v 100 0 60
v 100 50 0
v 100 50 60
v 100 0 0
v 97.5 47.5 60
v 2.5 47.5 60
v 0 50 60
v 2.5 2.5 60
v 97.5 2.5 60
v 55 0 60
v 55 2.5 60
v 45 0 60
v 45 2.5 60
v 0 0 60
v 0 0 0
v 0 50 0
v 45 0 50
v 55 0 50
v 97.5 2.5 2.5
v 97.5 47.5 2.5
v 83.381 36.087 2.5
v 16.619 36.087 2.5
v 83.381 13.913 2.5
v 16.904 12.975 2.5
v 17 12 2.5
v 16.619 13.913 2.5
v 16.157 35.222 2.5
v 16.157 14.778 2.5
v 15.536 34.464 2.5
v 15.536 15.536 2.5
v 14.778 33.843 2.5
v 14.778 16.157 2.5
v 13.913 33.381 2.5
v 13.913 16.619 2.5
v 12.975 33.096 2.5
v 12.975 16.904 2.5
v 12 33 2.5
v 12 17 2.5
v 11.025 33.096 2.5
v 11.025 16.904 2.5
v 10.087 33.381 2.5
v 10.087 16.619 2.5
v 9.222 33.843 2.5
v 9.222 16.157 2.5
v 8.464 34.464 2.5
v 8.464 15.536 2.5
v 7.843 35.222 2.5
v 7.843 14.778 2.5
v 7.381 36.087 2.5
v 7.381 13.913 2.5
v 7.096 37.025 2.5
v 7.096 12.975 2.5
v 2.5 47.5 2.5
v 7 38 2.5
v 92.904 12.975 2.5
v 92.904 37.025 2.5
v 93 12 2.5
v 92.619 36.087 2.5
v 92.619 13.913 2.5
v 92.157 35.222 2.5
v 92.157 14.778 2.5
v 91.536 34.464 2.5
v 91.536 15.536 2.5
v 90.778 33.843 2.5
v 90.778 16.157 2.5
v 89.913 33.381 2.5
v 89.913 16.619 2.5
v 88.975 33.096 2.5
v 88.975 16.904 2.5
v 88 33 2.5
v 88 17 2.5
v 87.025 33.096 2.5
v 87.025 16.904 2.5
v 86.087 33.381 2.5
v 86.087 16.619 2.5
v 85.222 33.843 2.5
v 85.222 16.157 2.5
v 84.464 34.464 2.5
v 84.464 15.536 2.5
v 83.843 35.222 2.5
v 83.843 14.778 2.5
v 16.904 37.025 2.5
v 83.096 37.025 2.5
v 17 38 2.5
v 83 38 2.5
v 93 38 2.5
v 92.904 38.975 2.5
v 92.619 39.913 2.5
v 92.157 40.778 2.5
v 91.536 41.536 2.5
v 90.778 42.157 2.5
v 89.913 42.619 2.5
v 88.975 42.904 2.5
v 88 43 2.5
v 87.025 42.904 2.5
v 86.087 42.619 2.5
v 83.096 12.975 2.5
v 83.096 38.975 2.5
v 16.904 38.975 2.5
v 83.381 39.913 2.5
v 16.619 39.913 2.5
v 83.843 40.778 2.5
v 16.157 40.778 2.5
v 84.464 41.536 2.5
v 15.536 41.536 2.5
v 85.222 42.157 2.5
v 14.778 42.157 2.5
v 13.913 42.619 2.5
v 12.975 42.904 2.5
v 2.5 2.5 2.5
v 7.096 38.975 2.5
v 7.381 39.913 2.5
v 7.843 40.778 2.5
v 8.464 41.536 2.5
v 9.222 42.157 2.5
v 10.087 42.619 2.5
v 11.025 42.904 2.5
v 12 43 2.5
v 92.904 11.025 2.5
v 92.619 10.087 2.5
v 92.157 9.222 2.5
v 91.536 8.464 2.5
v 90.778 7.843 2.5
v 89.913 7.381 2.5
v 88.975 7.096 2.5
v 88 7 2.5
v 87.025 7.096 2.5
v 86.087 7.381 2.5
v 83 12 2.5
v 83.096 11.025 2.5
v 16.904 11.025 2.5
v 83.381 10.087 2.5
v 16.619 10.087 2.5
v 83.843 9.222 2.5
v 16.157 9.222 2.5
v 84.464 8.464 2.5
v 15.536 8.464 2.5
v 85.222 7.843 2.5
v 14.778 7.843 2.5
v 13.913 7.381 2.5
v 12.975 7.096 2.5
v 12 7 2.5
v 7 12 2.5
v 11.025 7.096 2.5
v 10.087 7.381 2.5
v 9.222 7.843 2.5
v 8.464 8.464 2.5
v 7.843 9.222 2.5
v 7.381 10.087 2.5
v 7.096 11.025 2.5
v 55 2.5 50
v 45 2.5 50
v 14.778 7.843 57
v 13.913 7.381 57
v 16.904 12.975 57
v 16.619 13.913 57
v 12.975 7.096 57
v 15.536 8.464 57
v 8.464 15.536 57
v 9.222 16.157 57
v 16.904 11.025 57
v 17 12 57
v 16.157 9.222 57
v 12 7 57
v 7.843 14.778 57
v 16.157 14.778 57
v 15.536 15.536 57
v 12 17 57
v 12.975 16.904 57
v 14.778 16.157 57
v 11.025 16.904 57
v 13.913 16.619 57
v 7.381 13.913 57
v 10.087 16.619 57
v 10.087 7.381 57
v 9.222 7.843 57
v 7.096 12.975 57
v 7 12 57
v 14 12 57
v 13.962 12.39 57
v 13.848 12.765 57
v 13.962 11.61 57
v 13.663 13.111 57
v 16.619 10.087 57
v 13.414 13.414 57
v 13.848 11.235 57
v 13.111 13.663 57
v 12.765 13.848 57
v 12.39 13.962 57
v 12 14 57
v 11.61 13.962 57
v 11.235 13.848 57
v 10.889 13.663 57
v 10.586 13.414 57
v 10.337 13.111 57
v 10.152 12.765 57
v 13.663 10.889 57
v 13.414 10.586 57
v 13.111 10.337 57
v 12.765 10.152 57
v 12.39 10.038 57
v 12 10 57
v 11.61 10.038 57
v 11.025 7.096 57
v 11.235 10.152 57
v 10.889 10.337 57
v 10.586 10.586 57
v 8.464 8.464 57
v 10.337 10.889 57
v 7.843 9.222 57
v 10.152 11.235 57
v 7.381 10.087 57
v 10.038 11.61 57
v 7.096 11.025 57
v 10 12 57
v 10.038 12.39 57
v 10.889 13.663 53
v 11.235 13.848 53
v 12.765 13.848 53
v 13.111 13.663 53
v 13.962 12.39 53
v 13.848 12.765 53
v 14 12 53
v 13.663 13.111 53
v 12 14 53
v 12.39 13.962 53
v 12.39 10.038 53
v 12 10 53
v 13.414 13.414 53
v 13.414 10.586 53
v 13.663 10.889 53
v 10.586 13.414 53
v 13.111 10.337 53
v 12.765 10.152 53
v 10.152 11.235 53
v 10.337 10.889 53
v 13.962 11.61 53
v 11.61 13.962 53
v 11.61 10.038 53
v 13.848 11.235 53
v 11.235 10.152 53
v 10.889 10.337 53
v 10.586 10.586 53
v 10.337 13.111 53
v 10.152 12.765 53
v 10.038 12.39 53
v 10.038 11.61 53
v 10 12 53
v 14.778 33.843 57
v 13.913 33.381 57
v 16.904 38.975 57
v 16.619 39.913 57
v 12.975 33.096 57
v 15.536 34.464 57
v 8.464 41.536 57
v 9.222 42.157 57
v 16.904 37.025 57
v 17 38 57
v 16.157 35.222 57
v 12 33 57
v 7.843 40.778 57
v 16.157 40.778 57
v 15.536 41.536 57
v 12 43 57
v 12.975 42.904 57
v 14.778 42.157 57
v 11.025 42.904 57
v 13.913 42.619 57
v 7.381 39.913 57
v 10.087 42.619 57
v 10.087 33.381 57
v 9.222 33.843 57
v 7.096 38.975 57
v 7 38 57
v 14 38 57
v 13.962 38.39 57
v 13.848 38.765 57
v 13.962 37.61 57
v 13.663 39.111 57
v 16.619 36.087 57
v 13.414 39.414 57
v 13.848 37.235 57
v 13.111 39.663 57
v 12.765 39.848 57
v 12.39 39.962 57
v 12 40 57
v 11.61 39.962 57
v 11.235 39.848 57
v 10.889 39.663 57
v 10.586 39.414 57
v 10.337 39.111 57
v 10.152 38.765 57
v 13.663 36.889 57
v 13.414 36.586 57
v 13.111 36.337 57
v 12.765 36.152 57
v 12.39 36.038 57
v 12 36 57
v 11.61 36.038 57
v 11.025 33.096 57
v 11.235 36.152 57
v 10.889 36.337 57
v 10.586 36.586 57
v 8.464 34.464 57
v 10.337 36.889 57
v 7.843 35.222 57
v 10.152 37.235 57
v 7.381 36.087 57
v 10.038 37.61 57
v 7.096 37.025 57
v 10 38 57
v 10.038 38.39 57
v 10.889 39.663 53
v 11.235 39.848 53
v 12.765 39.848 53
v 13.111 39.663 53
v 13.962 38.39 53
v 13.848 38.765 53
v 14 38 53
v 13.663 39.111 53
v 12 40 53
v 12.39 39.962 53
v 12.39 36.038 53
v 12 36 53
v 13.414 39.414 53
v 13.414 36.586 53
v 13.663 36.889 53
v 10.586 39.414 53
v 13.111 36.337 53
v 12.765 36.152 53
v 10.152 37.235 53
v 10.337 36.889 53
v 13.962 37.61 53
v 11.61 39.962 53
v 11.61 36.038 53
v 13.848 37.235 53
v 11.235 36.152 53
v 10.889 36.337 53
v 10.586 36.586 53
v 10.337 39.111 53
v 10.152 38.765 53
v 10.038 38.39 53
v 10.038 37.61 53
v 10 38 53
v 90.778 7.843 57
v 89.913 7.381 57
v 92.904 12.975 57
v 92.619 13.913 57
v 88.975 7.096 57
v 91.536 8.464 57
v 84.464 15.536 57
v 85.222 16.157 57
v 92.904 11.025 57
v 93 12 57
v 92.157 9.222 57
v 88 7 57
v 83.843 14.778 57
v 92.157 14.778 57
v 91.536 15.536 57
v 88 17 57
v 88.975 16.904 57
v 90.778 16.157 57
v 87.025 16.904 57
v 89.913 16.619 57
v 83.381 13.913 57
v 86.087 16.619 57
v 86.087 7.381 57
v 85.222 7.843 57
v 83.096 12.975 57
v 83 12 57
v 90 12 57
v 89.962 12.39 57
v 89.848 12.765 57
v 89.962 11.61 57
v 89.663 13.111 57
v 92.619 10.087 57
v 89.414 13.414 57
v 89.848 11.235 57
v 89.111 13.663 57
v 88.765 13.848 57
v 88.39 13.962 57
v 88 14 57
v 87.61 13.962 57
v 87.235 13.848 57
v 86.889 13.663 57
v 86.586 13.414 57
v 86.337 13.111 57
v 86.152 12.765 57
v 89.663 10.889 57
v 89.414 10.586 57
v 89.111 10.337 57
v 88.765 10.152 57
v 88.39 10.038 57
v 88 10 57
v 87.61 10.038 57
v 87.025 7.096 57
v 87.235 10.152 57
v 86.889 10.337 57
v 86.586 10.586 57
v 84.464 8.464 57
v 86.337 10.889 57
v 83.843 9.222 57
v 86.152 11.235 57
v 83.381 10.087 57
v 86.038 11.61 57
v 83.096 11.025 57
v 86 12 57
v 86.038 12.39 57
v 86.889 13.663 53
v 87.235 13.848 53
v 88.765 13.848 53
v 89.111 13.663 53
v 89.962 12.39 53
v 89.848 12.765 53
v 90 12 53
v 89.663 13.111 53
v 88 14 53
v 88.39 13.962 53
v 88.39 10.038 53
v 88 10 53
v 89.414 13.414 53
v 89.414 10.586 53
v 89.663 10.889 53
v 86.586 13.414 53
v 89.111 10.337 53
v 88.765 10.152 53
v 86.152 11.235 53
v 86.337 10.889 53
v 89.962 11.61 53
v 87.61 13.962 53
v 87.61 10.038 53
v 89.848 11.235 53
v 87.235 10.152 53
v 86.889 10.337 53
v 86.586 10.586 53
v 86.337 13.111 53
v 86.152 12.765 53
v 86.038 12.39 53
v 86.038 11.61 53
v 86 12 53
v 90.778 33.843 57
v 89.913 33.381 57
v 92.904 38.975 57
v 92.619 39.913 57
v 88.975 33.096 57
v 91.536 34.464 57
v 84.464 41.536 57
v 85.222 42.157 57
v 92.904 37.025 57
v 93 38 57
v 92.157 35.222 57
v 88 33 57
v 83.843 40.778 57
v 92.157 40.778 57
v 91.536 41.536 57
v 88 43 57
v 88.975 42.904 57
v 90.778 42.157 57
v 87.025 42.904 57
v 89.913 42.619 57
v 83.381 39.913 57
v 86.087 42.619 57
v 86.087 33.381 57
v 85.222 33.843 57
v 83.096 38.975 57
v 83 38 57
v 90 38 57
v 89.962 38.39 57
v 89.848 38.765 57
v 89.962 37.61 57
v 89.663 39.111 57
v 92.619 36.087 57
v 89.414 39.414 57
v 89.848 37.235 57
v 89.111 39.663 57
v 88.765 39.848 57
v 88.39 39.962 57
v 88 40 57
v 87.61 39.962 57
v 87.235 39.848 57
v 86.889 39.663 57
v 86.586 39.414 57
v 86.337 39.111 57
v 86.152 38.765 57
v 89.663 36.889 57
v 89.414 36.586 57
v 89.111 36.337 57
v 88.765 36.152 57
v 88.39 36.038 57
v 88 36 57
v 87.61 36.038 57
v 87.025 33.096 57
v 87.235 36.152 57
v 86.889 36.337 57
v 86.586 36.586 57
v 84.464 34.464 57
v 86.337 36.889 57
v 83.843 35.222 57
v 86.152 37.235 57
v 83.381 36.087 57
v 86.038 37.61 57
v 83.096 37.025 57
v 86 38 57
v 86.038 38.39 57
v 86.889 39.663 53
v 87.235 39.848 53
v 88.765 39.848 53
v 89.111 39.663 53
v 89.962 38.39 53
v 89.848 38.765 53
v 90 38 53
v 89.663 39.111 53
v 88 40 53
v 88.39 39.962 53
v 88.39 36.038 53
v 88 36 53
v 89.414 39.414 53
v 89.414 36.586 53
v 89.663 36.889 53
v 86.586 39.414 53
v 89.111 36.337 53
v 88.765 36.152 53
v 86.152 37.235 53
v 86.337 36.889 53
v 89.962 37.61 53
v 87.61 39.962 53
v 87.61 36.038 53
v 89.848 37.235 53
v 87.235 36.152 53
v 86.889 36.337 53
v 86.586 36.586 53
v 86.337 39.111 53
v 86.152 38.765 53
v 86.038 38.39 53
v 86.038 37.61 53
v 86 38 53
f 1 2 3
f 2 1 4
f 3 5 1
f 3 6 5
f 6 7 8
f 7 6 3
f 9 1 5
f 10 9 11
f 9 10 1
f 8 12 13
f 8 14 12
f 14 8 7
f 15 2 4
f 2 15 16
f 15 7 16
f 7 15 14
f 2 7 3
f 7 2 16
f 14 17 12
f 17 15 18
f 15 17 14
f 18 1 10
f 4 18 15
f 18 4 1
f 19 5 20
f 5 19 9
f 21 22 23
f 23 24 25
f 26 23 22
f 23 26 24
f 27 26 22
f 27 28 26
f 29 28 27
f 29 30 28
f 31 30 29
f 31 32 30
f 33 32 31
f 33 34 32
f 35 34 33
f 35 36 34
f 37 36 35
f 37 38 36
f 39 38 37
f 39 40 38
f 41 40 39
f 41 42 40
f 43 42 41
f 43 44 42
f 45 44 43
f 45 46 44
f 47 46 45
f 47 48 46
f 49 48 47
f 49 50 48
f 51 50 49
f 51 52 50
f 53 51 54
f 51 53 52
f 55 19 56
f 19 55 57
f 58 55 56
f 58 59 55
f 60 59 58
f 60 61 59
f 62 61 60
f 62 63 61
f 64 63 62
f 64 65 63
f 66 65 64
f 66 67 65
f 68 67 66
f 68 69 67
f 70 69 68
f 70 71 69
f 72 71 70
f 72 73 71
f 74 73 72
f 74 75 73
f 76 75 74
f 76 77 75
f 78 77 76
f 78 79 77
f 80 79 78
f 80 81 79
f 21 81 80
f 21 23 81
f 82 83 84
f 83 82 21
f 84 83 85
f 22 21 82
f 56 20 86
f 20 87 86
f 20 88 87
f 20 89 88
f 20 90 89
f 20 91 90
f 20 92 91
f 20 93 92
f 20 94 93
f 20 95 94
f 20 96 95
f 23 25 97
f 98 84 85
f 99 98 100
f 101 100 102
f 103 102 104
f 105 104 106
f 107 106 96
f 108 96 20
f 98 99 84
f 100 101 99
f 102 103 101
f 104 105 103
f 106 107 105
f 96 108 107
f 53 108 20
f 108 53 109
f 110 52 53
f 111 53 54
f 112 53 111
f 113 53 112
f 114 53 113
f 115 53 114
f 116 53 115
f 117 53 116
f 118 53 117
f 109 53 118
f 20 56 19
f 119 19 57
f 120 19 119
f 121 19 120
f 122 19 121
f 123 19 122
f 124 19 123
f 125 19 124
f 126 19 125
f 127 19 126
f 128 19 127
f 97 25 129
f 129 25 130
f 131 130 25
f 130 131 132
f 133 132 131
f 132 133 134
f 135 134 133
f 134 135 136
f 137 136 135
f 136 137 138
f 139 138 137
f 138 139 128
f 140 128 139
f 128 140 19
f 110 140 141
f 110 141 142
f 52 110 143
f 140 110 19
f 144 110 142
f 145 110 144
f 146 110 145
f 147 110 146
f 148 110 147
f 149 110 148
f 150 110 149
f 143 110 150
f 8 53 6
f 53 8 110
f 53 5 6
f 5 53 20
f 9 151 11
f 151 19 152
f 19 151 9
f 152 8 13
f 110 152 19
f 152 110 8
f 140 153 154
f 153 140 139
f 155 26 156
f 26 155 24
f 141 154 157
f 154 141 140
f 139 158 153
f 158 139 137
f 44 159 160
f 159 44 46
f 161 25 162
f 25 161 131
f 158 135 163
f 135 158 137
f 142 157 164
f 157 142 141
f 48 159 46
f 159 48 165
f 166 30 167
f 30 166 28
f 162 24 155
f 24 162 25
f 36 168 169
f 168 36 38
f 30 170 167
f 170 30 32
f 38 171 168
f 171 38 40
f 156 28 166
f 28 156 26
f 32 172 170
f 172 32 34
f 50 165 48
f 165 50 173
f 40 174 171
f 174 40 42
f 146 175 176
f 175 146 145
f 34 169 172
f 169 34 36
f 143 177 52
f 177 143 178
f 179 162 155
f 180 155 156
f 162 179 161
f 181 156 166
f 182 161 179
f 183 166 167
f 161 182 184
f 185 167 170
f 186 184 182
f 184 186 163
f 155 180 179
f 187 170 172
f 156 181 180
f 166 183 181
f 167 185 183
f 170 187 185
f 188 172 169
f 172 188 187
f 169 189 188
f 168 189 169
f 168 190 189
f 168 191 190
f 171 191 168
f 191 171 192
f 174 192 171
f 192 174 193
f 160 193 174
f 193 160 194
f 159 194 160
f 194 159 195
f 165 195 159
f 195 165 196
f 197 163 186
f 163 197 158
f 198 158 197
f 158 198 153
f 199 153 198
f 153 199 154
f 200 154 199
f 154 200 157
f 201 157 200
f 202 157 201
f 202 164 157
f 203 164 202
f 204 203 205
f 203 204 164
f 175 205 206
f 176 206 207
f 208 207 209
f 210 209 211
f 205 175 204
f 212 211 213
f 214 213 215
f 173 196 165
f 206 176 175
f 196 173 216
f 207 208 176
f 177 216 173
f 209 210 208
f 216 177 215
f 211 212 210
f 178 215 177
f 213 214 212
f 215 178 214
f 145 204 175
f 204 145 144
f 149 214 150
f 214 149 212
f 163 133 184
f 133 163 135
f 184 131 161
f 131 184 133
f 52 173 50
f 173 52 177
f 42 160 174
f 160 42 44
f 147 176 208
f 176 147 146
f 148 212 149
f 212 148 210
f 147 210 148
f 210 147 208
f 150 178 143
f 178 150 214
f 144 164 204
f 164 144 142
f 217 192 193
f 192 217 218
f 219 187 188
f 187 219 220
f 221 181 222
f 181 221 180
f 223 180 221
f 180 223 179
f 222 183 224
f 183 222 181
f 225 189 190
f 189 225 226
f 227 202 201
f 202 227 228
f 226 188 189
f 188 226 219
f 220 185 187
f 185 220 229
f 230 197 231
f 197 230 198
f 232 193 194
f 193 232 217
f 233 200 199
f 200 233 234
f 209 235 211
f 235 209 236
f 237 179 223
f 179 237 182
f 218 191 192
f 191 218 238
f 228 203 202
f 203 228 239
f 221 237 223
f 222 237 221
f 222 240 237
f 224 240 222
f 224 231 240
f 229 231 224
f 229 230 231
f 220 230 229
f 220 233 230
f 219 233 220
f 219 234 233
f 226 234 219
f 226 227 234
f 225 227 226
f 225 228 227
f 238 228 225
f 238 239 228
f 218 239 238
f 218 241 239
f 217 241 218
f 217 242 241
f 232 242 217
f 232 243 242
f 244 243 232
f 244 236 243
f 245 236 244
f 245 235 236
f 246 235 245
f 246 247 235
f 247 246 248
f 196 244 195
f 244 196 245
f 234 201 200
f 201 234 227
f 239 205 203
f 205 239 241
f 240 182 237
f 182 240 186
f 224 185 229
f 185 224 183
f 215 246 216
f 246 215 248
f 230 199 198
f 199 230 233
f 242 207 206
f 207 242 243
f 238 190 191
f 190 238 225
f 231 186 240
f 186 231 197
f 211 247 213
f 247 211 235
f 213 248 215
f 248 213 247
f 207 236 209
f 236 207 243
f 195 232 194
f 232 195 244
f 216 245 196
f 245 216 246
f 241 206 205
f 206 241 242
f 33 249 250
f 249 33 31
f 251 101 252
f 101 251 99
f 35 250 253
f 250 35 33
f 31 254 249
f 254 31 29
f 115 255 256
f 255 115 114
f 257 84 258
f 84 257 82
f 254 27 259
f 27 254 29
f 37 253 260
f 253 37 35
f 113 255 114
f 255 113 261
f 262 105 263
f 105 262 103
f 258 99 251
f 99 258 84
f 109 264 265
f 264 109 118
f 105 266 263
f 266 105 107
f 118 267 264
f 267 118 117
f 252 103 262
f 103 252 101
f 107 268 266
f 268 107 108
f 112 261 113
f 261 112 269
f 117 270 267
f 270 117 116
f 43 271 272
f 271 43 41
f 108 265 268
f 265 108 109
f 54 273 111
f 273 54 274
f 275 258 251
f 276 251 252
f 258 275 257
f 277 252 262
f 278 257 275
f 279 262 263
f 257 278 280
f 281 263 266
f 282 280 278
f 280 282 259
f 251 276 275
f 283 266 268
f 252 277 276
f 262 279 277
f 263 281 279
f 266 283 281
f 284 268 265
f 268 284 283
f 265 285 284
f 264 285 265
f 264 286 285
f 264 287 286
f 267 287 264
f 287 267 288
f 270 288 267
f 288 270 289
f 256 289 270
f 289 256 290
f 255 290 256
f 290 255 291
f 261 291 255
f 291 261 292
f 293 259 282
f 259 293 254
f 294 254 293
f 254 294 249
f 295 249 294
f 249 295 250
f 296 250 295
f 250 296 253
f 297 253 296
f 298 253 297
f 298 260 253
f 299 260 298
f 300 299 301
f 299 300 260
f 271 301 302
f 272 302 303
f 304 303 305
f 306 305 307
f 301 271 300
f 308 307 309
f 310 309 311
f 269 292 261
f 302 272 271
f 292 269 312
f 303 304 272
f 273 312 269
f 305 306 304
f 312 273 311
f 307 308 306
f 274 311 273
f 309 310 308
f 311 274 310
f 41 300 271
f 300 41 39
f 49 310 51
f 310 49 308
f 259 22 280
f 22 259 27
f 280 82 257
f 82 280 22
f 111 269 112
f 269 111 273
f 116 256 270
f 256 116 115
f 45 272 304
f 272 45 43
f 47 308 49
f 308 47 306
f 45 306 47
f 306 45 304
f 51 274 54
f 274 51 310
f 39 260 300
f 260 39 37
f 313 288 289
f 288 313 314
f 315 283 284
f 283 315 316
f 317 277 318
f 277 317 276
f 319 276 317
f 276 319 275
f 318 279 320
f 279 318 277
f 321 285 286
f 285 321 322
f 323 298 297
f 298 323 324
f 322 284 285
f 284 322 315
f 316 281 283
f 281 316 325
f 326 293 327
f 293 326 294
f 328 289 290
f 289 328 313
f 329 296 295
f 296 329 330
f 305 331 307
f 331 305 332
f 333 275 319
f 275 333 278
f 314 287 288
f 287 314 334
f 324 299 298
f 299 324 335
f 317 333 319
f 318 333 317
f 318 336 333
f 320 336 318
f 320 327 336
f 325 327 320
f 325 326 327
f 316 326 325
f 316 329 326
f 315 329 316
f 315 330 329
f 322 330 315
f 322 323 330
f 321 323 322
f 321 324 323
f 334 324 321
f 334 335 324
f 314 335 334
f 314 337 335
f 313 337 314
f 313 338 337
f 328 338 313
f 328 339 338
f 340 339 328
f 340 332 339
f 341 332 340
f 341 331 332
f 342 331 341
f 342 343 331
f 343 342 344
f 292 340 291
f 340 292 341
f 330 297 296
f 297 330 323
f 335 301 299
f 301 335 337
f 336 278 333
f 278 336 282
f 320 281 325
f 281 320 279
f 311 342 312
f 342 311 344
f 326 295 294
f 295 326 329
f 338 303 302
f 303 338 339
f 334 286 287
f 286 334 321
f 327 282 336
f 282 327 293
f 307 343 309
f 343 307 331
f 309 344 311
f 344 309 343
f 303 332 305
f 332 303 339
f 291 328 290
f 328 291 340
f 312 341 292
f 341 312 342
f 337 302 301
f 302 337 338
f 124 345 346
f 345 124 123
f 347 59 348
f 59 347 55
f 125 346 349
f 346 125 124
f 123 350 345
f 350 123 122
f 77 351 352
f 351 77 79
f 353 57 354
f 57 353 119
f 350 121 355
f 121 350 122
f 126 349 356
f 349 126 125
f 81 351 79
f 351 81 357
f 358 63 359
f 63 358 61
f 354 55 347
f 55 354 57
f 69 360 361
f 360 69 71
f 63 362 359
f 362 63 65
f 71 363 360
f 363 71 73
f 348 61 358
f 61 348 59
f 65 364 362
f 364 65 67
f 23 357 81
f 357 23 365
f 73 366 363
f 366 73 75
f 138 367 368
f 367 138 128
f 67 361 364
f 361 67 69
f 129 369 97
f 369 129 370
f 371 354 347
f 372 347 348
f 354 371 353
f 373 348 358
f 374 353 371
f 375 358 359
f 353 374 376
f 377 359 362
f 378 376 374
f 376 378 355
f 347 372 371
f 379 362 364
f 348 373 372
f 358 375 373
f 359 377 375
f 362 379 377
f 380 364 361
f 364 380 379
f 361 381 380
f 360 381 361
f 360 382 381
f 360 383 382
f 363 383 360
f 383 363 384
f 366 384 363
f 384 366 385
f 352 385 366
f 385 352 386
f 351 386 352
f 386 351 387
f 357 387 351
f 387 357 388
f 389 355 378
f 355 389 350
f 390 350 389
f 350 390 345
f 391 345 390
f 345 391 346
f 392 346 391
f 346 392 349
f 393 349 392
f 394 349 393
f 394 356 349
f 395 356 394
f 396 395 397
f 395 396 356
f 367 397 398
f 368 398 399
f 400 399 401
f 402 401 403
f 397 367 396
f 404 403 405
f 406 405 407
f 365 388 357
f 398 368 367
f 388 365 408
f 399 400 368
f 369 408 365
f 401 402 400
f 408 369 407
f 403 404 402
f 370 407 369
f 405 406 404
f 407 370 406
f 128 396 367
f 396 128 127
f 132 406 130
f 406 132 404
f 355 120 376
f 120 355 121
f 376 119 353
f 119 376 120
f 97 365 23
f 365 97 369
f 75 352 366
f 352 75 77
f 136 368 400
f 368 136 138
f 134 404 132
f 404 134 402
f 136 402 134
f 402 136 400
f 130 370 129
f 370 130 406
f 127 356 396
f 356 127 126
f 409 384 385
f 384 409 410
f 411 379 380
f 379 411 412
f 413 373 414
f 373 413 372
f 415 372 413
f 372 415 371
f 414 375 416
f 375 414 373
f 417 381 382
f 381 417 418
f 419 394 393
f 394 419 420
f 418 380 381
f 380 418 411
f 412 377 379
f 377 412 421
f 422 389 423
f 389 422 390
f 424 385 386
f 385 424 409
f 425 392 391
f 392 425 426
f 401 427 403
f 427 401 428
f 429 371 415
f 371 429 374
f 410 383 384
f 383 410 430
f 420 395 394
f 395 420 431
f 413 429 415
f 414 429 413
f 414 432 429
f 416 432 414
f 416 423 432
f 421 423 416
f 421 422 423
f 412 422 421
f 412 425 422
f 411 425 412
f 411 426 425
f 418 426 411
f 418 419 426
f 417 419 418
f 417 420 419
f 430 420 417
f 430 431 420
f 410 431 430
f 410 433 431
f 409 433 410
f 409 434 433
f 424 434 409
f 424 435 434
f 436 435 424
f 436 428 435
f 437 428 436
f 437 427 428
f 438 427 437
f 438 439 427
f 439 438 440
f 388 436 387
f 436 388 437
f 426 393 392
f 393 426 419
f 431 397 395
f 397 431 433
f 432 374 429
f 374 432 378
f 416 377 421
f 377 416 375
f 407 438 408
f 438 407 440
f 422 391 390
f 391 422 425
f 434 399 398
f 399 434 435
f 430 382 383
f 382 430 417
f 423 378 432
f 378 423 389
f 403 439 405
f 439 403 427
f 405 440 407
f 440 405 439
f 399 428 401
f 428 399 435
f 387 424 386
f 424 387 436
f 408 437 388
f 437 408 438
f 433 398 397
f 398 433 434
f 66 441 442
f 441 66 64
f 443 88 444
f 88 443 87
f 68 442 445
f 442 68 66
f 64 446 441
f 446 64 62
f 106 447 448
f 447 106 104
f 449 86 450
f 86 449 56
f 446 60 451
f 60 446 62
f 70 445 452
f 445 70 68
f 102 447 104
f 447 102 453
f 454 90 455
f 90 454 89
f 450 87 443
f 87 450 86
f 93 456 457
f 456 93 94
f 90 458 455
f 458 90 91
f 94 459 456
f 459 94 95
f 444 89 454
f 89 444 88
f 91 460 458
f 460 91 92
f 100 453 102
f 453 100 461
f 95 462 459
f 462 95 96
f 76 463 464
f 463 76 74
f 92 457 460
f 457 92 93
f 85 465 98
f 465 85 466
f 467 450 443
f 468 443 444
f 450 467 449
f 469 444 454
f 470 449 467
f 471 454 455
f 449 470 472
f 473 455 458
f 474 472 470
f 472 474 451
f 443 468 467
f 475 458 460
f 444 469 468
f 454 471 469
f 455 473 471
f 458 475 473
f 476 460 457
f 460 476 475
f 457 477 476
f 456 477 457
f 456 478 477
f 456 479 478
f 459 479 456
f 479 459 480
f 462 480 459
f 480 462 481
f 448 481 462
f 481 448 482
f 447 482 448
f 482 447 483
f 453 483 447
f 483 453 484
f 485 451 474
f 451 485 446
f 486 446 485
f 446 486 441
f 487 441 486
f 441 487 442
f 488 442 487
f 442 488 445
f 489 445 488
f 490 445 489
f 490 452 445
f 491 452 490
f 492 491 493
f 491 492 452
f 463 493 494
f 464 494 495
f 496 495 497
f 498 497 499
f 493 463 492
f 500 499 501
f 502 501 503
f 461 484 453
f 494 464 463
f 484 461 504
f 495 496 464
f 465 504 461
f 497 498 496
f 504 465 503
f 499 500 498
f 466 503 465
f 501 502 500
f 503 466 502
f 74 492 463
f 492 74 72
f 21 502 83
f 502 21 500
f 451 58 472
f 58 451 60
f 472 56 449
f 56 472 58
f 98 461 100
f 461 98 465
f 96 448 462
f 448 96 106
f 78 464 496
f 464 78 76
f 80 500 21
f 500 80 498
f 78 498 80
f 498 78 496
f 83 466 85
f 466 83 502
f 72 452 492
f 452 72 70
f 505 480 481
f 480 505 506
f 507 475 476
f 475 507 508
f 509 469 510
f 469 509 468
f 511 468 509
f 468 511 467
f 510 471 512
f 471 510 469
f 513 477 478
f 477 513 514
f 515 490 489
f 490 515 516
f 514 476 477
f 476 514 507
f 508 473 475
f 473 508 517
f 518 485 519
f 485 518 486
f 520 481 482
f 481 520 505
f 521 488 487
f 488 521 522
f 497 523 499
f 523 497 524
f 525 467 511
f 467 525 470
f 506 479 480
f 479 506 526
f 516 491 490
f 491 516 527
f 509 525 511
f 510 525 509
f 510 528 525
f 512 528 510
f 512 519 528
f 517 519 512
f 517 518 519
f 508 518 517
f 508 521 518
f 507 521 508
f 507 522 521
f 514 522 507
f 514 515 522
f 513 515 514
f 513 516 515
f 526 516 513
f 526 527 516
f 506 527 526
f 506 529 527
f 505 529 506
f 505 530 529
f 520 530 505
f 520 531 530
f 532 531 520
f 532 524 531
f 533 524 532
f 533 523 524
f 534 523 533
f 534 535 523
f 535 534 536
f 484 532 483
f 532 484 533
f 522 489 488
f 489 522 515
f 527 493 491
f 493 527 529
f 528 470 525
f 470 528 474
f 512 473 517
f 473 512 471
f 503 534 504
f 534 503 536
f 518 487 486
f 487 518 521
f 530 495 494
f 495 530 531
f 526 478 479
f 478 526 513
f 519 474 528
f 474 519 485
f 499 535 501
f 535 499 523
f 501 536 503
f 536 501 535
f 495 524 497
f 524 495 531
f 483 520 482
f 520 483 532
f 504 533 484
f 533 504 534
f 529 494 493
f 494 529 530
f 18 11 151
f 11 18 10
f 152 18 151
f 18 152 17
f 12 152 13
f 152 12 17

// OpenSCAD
$fn = 32;

// ----------------------------------------------------------------------
// Enclosure box: both enclosure
// ----------------------------------------------------------------------

// --- parameters (mm) ---
box_l = 100;              // outer length, X
box_w = 50;               // outer width, Y
box_h = 60;               // outer height
wall_t = 2.5;             // wall thickness
boss_r = 5;               // corner boss radius
hole_r = 2;               // boss screw hole radius
boss_in = 12;             // boss inset from the corners
notch_w = 10;             // cable notch width
notch_h = 10;             // cable notch height

inner_h = box_h - wall_t;  // cavity depth
boss_h = inner_h - 2;  // corner boss height

difference() {
  union() {
    difference() {
      cube([box_l, box_w, box_h]);
      translate([wall_t, wall_t, wall_t])
        cube([box_l - 2 * wall_t, box_w - 2 * wall_t, box_h]);
    }
    for (sx = [0, 1], sy = [0, 1])
      translate([sx ? box_l - boss_in : boss_in,
                 sy ? box_w - boss_in : boss_in, wall_t - 1])
        difference() {
          cylinder(r = boss_r, h = boss_h);
          translate([0, 0, boss_h - 4])
            cylinder(r = hole_r, h = 5);
        }
  }
  translate([box_l / 2 - notch_w / 2, -1, box_h - notch_h])
    cube([notch_w, wall_t + 2, notch_h + 1]);
}
